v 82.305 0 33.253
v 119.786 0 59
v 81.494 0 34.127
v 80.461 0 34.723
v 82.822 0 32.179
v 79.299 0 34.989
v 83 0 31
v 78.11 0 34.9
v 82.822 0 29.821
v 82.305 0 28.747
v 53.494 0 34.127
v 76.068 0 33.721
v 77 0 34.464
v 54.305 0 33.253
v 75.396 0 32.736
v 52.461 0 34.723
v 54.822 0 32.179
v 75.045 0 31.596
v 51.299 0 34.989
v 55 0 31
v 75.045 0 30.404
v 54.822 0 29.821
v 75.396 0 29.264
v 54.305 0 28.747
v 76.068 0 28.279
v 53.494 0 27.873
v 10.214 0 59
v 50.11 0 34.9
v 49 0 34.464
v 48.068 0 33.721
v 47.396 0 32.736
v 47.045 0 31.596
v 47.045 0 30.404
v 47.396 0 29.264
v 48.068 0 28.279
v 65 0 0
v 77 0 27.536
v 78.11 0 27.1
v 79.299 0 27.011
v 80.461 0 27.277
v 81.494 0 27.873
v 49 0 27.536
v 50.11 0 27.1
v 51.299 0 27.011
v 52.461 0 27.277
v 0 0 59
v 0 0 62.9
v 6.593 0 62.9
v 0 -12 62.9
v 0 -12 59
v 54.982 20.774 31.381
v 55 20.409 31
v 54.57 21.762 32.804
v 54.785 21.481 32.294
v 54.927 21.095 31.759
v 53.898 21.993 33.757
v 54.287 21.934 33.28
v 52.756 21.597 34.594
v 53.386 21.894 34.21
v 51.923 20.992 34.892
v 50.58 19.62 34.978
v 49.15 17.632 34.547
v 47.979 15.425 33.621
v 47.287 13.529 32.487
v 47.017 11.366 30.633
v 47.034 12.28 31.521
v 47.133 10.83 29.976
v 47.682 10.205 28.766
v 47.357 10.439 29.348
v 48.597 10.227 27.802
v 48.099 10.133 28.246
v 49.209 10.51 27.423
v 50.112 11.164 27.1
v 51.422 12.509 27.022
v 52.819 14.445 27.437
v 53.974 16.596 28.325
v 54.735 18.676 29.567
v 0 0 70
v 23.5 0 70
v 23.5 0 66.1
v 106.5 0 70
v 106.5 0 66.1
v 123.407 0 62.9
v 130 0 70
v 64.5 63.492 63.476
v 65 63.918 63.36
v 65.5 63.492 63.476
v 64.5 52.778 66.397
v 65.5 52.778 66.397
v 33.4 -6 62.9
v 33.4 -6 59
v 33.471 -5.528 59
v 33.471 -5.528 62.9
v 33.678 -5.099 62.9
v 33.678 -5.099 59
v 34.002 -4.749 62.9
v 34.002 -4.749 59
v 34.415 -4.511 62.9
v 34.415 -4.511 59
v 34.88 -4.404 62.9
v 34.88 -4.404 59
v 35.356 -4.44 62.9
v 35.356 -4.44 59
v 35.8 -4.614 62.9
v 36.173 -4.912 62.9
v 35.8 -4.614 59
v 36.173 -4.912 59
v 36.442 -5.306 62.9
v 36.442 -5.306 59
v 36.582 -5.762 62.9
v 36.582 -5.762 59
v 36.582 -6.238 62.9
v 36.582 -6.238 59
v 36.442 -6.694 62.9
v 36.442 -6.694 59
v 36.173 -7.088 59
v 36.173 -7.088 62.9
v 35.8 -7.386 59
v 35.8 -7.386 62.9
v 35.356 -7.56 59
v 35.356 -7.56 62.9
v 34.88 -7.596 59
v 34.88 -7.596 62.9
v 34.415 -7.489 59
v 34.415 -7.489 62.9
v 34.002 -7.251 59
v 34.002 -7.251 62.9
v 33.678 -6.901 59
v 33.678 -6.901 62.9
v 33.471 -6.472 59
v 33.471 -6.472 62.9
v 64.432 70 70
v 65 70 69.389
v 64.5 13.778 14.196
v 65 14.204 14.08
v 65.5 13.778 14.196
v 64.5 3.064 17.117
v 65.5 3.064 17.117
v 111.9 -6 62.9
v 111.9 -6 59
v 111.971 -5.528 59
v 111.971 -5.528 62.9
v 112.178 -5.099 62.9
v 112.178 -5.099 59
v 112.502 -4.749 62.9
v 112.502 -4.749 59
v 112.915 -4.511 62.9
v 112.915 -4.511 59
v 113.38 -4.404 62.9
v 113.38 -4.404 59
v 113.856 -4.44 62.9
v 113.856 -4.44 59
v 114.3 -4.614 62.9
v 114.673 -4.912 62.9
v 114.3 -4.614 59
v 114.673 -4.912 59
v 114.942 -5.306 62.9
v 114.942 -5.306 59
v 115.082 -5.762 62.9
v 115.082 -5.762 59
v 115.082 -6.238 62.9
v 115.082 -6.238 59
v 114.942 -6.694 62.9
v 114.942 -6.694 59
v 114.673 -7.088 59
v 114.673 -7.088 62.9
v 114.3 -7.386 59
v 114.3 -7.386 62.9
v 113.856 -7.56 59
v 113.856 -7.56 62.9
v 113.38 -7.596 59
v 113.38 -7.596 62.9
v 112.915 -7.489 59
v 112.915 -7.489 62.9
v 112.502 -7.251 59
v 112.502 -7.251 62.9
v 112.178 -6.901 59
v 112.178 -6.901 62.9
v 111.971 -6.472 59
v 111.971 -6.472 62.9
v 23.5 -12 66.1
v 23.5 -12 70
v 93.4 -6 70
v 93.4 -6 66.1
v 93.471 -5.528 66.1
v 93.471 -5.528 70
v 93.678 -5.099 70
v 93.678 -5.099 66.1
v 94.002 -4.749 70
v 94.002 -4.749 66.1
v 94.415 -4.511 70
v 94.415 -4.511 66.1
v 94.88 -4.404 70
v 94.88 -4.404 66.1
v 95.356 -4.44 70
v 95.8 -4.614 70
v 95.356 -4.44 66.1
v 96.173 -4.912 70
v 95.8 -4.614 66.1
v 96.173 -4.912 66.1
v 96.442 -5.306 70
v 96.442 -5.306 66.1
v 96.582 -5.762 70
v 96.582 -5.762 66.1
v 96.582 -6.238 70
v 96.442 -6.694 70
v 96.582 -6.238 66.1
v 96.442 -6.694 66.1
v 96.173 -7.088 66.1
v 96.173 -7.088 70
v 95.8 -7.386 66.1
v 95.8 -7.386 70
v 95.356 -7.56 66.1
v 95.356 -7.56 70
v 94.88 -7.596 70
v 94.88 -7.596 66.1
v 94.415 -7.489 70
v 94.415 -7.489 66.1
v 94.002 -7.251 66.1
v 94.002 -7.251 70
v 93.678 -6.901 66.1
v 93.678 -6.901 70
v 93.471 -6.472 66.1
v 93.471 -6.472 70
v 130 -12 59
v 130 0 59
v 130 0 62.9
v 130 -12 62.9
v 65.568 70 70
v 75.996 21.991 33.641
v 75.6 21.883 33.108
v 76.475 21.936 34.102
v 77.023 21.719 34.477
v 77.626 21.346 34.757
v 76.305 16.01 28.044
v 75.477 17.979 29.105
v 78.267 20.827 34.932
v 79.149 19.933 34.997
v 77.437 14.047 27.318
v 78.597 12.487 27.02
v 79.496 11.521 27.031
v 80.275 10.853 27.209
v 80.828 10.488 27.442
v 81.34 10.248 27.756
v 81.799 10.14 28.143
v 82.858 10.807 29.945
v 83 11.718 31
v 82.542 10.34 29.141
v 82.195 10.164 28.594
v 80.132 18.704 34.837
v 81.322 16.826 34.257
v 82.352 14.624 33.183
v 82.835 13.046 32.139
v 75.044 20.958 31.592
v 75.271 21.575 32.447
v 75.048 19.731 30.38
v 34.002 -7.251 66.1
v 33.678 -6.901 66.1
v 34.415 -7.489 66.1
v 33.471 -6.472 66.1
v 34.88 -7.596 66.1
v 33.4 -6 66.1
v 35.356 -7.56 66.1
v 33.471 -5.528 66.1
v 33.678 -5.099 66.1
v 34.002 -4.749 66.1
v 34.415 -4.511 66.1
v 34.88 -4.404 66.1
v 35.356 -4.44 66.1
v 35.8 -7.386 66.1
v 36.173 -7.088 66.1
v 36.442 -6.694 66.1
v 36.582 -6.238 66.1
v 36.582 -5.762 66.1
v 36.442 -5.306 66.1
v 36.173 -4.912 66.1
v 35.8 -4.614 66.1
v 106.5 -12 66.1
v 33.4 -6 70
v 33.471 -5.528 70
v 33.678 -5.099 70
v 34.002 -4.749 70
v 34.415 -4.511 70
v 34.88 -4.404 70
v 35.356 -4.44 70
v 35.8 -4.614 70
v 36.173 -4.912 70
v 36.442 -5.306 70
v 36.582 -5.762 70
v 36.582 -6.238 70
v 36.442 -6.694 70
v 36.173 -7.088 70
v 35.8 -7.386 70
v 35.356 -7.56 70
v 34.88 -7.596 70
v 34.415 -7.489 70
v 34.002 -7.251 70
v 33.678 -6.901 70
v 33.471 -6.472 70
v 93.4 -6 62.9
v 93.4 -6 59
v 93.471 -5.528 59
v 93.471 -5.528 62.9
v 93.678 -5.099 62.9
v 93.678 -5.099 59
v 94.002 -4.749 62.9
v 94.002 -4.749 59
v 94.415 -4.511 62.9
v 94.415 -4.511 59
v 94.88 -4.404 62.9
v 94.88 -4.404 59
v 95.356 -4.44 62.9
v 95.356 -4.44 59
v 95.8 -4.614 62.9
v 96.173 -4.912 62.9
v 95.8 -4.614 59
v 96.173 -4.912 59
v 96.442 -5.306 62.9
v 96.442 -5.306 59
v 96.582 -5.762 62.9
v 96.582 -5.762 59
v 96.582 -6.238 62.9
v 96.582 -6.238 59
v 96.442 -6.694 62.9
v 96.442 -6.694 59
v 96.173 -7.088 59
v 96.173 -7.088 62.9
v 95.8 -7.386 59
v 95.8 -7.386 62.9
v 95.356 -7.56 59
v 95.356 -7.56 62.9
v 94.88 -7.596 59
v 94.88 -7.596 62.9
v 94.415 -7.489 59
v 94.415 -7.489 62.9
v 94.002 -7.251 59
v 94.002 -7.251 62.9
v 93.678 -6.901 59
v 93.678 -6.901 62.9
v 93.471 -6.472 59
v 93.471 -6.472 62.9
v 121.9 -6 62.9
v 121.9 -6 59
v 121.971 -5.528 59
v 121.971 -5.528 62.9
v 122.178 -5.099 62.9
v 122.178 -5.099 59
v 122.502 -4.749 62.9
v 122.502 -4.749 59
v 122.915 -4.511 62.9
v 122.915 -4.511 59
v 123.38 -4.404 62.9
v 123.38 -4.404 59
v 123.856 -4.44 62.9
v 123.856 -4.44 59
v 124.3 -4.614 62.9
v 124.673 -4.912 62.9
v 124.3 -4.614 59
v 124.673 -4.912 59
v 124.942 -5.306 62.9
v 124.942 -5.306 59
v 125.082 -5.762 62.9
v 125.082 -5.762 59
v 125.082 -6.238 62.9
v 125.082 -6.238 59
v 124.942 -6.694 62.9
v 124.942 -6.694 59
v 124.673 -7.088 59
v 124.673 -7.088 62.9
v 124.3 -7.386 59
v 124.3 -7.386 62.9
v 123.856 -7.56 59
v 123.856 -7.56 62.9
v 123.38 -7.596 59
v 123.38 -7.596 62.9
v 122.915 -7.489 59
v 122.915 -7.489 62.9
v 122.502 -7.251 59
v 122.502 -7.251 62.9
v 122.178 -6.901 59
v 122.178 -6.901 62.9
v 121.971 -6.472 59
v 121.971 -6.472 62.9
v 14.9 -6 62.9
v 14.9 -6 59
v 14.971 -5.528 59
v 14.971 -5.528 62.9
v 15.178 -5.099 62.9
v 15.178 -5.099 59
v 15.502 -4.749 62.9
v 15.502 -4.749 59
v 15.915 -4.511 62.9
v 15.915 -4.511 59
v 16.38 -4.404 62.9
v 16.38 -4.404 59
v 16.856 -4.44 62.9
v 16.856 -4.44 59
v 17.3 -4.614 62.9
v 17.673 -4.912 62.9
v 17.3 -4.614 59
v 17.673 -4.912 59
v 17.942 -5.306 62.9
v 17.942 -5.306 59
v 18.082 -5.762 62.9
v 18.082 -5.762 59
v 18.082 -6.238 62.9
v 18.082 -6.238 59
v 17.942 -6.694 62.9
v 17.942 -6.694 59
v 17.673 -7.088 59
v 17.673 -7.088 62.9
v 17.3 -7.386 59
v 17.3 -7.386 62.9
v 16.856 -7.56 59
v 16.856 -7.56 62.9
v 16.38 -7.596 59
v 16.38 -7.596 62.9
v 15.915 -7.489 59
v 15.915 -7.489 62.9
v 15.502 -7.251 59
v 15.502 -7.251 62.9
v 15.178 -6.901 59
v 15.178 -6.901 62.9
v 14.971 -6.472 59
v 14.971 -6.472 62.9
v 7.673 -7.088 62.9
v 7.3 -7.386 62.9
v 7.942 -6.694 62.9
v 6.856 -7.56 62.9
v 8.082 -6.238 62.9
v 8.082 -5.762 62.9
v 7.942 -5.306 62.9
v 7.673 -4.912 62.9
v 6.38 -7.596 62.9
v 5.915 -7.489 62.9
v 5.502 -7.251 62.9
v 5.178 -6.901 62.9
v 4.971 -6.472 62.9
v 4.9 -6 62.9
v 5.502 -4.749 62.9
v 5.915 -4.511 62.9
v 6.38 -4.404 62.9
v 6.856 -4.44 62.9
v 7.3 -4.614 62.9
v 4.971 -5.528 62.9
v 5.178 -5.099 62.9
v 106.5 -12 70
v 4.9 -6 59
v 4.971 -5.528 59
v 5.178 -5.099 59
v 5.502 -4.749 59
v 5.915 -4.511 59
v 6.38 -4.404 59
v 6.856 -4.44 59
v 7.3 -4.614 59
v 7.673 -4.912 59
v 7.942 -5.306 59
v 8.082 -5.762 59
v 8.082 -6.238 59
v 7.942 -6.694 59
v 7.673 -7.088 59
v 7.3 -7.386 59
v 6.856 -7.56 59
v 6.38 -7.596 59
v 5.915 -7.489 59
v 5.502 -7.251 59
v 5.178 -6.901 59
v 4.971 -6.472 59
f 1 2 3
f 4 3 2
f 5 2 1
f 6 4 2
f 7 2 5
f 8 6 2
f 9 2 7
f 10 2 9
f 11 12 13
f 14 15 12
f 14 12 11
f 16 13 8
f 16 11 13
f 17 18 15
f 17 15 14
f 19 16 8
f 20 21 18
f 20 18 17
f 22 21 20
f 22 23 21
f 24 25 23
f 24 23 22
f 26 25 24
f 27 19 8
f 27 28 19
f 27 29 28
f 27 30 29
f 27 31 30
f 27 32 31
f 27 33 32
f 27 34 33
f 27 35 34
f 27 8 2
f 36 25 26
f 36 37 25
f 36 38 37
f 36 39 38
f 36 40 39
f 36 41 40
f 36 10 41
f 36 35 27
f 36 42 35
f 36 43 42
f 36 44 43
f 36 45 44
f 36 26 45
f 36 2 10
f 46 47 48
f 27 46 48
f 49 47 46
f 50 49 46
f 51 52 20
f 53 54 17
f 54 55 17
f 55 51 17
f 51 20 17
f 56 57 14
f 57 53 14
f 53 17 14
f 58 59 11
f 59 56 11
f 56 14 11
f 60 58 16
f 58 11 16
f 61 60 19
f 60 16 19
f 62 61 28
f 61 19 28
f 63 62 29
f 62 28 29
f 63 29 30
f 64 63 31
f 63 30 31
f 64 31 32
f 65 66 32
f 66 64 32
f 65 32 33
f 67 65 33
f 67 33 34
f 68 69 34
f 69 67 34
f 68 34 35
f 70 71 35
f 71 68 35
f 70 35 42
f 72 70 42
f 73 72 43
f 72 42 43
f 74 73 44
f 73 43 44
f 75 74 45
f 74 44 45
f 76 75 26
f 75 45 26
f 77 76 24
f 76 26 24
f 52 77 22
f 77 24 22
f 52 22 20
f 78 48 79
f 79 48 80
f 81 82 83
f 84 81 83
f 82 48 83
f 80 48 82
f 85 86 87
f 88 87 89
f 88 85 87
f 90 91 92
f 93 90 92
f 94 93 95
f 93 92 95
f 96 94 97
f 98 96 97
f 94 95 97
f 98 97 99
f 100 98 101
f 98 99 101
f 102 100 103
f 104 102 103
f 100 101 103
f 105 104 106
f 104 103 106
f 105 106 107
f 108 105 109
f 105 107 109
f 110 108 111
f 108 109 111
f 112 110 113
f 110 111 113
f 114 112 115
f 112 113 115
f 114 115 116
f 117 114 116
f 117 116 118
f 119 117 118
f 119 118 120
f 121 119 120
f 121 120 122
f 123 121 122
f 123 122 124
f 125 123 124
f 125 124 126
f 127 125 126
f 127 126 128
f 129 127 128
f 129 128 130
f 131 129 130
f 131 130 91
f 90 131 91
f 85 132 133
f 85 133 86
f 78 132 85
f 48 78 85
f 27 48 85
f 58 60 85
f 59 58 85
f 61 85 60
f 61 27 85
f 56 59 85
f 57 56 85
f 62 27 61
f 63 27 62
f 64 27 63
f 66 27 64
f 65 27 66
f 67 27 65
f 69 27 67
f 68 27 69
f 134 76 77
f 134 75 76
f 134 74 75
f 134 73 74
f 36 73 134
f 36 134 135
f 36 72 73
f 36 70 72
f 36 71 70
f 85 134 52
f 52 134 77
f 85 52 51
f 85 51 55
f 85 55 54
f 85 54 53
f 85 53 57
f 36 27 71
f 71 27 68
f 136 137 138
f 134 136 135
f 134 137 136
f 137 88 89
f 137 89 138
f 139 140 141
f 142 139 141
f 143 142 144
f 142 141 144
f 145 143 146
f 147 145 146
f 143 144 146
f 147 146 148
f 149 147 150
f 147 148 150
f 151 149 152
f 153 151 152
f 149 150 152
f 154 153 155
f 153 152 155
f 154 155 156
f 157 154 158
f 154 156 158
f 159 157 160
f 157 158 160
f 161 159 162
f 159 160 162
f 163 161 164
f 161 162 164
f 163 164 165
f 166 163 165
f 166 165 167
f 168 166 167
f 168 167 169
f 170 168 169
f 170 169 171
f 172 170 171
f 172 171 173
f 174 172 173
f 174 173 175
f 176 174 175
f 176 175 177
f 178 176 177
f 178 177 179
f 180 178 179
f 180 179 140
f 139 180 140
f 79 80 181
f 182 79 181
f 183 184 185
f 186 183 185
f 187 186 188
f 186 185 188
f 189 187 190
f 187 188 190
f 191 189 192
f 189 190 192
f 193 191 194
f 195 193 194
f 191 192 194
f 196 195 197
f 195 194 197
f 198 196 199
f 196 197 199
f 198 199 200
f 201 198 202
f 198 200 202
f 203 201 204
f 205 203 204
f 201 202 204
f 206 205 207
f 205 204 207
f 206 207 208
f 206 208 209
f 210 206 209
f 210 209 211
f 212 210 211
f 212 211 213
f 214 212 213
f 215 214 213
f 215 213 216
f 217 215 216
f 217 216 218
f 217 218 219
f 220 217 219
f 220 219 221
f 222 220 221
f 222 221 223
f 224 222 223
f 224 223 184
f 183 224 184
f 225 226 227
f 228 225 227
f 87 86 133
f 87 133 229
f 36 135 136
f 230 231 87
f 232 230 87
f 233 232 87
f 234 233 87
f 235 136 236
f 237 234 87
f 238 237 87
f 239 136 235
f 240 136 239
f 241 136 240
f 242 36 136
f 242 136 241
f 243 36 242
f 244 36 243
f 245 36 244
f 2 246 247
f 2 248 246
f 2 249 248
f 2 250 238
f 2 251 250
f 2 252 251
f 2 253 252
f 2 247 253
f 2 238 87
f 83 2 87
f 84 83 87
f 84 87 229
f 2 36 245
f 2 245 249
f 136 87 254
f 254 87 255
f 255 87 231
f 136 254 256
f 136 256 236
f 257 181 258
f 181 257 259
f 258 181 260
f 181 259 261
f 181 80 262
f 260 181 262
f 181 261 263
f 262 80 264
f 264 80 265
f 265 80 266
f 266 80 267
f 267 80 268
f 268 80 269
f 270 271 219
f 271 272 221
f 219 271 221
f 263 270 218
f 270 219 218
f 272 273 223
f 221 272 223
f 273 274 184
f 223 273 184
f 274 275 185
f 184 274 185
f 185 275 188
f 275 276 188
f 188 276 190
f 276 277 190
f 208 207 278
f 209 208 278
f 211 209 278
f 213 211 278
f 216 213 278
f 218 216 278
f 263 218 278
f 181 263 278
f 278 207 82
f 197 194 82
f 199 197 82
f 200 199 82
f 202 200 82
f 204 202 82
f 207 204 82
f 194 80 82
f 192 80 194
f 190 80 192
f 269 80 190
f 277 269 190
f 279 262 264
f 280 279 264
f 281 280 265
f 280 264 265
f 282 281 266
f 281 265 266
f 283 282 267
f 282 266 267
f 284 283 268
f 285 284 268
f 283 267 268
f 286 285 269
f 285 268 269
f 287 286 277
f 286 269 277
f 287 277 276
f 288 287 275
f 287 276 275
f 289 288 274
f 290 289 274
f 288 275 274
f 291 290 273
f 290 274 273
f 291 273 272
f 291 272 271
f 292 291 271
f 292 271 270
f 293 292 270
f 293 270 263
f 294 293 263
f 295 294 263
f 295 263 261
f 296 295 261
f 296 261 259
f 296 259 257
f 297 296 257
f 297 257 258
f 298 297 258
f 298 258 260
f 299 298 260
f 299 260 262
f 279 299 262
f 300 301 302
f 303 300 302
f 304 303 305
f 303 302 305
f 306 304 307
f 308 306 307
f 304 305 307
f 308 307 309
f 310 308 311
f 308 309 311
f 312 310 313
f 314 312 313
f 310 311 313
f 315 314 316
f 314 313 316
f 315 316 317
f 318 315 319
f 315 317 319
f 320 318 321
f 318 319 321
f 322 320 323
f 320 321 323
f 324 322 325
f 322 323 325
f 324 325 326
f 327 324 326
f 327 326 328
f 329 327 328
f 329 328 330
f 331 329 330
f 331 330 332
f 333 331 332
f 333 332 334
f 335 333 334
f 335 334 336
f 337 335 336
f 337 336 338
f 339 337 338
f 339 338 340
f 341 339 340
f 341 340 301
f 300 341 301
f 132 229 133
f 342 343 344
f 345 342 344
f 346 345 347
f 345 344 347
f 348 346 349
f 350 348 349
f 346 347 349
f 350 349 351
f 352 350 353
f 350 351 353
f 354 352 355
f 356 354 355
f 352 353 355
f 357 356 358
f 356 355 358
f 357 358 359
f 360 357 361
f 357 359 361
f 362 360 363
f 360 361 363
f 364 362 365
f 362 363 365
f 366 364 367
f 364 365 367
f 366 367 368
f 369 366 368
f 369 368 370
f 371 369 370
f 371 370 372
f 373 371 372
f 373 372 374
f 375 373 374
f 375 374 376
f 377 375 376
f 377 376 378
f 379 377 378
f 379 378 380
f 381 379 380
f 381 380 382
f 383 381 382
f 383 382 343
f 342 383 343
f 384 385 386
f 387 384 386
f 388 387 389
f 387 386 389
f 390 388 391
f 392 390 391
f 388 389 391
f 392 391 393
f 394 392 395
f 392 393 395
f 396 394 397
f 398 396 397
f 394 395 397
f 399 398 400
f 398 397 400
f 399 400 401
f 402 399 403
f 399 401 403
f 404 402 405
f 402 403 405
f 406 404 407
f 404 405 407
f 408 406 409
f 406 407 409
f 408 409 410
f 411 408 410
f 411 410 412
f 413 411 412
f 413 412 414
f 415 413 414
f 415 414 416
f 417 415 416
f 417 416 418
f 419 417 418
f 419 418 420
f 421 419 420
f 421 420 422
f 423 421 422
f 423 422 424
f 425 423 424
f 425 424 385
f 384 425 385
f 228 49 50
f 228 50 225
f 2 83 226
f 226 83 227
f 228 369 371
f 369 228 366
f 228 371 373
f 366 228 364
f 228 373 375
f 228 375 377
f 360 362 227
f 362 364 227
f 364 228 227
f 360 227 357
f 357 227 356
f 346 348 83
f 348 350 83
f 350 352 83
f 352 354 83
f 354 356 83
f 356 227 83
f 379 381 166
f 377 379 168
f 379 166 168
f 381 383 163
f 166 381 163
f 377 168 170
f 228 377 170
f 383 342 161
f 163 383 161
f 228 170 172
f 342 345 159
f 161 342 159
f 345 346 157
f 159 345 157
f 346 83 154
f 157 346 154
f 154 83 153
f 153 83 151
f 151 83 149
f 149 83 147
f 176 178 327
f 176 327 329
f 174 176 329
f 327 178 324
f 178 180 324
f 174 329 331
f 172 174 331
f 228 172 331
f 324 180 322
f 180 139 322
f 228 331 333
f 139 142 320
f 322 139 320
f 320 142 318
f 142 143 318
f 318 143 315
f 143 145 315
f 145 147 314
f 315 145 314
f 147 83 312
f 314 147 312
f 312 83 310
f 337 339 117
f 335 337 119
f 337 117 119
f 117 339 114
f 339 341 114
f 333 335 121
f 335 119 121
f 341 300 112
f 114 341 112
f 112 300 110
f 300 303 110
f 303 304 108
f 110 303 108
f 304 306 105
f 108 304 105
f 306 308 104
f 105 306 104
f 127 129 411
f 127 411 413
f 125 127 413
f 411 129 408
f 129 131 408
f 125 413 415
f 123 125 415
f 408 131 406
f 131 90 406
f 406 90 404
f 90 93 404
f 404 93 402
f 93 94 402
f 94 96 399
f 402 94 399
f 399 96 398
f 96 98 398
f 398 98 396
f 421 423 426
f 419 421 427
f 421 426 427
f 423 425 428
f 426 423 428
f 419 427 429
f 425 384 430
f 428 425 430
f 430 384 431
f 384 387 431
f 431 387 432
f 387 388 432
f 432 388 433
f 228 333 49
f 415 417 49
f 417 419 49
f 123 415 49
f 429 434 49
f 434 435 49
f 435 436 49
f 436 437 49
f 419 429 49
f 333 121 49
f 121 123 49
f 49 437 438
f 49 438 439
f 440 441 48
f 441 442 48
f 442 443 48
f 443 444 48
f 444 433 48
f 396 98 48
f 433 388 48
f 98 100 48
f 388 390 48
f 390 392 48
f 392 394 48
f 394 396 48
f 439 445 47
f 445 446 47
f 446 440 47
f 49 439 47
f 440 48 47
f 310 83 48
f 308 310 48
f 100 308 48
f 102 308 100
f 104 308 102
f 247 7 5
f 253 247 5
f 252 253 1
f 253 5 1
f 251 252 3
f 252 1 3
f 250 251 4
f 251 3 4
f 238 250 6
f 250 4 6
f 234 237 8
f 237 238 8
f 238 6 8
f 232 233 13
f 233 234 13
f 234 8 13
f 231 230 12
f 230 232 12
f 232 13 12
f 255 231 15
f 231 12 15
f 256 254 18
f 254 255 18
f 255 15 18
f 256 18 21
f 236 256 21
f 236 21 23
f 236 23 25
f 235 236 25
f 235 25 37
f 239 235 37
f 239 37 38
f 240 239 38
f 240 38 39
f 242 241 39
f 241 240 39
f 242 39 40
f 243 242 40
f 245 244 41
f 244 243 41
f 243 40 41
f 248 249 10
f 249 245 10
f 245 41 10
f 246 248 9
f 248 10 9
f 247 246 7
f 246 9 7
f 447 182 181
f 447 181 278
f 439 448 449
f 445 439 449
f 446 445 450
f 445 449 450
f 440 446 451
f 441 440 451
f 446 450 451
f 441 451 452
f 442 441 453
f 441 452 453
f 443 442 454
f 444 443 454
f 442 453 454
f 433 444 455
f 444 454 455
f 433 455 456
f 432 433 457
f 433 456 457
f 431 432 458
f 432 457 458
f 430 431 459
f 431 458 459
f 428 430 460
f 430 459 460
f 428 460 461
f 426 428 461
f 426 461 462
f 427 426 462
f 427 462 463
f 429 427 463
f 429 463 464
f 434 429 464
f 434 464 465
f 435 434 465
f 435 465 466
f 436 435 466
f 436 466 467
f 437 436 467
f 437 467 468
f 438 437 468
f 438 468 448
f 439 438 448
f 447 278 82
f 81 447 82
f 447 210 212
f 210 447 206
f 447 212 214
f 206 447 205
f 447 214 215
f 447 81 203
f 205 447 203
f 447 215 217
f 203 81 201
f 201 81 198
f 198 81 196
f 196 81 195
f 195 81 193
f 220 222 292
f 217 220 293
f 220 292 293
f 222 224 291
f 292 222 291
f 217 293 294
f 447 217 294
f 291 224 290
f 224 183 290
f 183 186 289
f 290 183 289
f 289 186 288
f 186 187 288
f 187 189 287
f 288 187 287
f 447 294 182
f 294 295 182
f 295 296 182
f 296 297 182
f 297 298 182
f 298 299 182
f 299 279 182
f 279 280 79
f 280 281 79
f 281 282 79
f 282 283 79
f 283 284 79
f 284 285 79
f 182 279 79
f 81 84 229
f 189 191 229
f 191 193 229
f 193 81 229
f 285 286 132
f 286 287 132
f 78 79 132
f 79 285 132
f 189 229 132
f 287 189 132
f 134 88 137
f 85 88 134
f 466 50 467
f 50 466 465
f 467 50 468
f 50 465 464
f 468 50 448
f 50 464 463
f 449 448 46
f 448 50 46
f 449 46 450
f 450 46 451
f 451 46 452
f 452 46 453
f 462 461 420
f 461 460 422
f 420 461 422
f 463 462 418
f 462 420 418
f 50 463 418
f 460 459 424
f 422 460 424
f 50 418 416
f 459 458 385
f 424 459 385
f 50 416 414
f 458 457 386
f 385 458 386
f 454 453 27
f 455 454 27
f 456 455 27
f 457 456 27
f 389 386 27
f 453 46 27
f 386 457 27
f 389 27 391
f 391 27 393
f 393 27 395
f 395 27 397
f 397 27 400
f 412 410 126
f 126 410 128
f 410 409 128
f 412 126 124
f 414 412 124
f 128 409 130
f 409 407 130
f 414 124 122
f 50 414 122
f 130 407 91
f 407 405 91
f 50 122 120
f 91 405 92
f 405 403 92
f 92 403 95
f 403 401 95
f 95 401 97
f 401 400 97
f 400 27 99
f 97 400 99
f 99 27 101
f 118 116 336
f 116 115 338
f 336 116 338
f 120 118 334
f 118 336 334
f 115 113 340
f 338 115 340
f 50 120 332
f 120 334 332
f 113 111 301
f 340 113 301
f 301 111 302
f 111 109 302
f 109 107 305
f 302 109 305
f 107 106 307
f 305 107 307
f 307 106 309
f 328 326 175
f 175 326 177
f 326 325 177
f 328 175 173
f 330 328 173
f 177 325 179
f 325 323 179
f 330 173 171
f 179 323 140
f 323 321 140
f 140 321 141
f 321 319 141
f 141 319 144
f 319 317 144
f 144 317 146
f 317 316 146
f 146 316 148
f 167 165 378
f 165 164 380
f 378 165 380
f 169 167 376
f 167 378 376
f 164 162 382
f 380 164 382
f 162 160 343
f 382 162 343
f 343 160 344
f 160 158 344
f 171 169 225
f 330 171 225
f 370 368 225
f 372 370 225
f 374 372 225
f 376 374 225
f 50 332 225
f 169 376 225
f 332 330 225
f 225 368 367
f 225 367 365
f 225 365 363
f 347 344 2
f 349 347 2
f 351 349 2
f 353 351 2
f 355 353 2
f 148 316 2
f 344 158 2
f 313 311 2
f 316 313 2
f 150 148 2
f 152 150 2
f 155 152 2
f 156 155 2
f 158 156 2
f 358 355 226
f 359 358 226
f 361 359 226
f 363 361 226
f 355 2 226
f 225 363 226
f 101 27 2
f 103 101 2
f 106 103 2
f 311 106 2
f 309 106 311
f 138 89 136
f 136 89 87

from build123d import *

# Parameters (mm, degrees)
BOSS_EXTRUDE1_DEPTH = 70
DRAFT3_ANGLE        = -34
SKETCH2_R           = 4
CUT_EXTRUDE1_DEPTH  = 70
CUT_EXTRUDE3_START  = 64.5
CUT_EXTRUDE3_DEPTH  = 1
SKETCH6_W           = 130
SKETCH6_H           = 3.9
BOSS_EXTRUDE2_DEPTH = 12
SKETCH7_R           = 1.6
CUT_EXTRUDE4_DEPTH  = 70
CUT_EXTRUDE5_START  = -6
SKETCH7_3_W         = 23.5
SKETCH7_3_H         = 12
SKETCH7_3_R         = 1.6
CUT_EXTRUDE5_DEPTH  = 70


with BuildPart() as part:
    # Sketch1 → Boss-Extrude1 (new body)
    with BuildSketch(Plane(origin=(0, 0, 0), x_dir=(1, 0, 0), z_dir=(0, 1, 0))):
        Polygon((65, 0), (0, -70), (130, -70), align=None)
    extrude(amount=BOSS_EXTRUDE1_DEPTH)

    # Draft3
    draft3_faces = [part.faces().sort_by_distance(p)[0] for p in [
        (97.5, 35, 35),
        (32.5, 35, 35),
    ]]
    draft(draft3_faces, Plane(origin=(0, 0, 0), x_dir=(0, 0, -1), z_dir=(0, -1, 0)), DRAFT3_ANGLE)

    # Sketch2 → Cut-Extrude1 (cut)
    with BuildSketch(Plane.XZ):
        with Locations((51, 31)):
            Circle(SKETCH2_R)
        with Locations((79, 31)):
            Circle(SKETCH2_R)
    extrude(amount=-CUT_EXTRUDE1_DEPTH, mode=Mode.SUBTRACT)

    # Sketch5 → Cut-Extrude3 (cut)
    with BuildSketch(Plane(origin=(0, 0, 0), x_dir=(0, 0, -1), z_dir=(1, 0, 0)).offset(CUT_EXTRUDE3_START)):
        Polygon((-14.079975623, 14.204023601), (-63.359890305, 63.918106202), (-66.397363247, 52.777769966), (-17.117448565, 3.063687364), align=None)
    extrude(amount=CUT_EXTRUDE3_DEPTH, mode=Mode.SUBTRACT)

    # Sketch6 → Boss-Extrude2 (add)
    with BuildSketch(Plane.XZ):
        with Locations((65, 68.05)):
            Rectangle(SKETCH6_W, SKETCH6_H)
        with Locations((65, 60.95)):
            Rectangle(SKETCH6_W, SKETCH6_H)
    extrude(amount=BOSS_EXTRUDE2_DEPTH)

    # Sketch7 → Cut-Extrude4 (cut)
    with BuildSketch(Plane(origin=(0, 0, 59), x_dir=(-1, 0, 0), z_dir=(0, 0, -1))):
        with Locations((-95, -6)):
            Circle(SKETCH7_R)
        with Locations((-123.5, -6)):
            Circle(SKETCH7_R)
        with Locations((-113.5, -6)):
            Circle(SKETCH7_R)
        with Locations((-6.5, -6)):
            Circle(SKETCH7_R)
        with Locations((-16.5, -6)):
            Circle(SKETCH7_R)
        with Locations((-35, -6)):
            Circle(SKETCH7_R)
    extrude(amount=-CUT_EXTRUDE4_DEPTH, mode=Mode.SUBTRACT)

    # Sketch7<3> → Cut-Extrude5 (cut)
    # profile 1 of 2: a face of its own
    with BuildSketch(Plane(origin=(0, 0, 59), x_dir=(-1, 0, 0), z_dir=(0, 0, -1)).offset(CUT_EXTRUDE5_START)):
        with Locations((-118.25, -6)):
            Rectangle(SKETCH7_3_W, SKETCH7_3_H)
        with Locations((-123.5, -6)):
            Circle(SKETCH7_3_R, mode=Mode.SUBTRACT)
        with Locations((-113.5, -6)):
            Circle(SKETCH7_3_R, mode=Mode.SUBTRACT)
    # profile 2 of 2: a face of its own
    with BuildSketch(Plane(origin=(0, 0, 59), x_dir=(-1, 0, 0), z_dir=(0, 0, -1)).offset(CUT_EXTRUDE5_START)):
        with Locations((-11.75, -6)):
            Rectangle(SKETCH7_3_W, SKETCH7_3_H)
        with Locations((-16.5, -6)):
            Circle(SKETCH7_3_R, mode=Mode.SUBTRACT)
        with Locations((-6.5, -6)):
            Circle(SKETCH7_3_R, mode=Mode.SUBTRACT)
    extrude(amount=-CUT_EXTRUDE5_DEPTH, mode=Mode.SUBTRACT)


solid = part.part
